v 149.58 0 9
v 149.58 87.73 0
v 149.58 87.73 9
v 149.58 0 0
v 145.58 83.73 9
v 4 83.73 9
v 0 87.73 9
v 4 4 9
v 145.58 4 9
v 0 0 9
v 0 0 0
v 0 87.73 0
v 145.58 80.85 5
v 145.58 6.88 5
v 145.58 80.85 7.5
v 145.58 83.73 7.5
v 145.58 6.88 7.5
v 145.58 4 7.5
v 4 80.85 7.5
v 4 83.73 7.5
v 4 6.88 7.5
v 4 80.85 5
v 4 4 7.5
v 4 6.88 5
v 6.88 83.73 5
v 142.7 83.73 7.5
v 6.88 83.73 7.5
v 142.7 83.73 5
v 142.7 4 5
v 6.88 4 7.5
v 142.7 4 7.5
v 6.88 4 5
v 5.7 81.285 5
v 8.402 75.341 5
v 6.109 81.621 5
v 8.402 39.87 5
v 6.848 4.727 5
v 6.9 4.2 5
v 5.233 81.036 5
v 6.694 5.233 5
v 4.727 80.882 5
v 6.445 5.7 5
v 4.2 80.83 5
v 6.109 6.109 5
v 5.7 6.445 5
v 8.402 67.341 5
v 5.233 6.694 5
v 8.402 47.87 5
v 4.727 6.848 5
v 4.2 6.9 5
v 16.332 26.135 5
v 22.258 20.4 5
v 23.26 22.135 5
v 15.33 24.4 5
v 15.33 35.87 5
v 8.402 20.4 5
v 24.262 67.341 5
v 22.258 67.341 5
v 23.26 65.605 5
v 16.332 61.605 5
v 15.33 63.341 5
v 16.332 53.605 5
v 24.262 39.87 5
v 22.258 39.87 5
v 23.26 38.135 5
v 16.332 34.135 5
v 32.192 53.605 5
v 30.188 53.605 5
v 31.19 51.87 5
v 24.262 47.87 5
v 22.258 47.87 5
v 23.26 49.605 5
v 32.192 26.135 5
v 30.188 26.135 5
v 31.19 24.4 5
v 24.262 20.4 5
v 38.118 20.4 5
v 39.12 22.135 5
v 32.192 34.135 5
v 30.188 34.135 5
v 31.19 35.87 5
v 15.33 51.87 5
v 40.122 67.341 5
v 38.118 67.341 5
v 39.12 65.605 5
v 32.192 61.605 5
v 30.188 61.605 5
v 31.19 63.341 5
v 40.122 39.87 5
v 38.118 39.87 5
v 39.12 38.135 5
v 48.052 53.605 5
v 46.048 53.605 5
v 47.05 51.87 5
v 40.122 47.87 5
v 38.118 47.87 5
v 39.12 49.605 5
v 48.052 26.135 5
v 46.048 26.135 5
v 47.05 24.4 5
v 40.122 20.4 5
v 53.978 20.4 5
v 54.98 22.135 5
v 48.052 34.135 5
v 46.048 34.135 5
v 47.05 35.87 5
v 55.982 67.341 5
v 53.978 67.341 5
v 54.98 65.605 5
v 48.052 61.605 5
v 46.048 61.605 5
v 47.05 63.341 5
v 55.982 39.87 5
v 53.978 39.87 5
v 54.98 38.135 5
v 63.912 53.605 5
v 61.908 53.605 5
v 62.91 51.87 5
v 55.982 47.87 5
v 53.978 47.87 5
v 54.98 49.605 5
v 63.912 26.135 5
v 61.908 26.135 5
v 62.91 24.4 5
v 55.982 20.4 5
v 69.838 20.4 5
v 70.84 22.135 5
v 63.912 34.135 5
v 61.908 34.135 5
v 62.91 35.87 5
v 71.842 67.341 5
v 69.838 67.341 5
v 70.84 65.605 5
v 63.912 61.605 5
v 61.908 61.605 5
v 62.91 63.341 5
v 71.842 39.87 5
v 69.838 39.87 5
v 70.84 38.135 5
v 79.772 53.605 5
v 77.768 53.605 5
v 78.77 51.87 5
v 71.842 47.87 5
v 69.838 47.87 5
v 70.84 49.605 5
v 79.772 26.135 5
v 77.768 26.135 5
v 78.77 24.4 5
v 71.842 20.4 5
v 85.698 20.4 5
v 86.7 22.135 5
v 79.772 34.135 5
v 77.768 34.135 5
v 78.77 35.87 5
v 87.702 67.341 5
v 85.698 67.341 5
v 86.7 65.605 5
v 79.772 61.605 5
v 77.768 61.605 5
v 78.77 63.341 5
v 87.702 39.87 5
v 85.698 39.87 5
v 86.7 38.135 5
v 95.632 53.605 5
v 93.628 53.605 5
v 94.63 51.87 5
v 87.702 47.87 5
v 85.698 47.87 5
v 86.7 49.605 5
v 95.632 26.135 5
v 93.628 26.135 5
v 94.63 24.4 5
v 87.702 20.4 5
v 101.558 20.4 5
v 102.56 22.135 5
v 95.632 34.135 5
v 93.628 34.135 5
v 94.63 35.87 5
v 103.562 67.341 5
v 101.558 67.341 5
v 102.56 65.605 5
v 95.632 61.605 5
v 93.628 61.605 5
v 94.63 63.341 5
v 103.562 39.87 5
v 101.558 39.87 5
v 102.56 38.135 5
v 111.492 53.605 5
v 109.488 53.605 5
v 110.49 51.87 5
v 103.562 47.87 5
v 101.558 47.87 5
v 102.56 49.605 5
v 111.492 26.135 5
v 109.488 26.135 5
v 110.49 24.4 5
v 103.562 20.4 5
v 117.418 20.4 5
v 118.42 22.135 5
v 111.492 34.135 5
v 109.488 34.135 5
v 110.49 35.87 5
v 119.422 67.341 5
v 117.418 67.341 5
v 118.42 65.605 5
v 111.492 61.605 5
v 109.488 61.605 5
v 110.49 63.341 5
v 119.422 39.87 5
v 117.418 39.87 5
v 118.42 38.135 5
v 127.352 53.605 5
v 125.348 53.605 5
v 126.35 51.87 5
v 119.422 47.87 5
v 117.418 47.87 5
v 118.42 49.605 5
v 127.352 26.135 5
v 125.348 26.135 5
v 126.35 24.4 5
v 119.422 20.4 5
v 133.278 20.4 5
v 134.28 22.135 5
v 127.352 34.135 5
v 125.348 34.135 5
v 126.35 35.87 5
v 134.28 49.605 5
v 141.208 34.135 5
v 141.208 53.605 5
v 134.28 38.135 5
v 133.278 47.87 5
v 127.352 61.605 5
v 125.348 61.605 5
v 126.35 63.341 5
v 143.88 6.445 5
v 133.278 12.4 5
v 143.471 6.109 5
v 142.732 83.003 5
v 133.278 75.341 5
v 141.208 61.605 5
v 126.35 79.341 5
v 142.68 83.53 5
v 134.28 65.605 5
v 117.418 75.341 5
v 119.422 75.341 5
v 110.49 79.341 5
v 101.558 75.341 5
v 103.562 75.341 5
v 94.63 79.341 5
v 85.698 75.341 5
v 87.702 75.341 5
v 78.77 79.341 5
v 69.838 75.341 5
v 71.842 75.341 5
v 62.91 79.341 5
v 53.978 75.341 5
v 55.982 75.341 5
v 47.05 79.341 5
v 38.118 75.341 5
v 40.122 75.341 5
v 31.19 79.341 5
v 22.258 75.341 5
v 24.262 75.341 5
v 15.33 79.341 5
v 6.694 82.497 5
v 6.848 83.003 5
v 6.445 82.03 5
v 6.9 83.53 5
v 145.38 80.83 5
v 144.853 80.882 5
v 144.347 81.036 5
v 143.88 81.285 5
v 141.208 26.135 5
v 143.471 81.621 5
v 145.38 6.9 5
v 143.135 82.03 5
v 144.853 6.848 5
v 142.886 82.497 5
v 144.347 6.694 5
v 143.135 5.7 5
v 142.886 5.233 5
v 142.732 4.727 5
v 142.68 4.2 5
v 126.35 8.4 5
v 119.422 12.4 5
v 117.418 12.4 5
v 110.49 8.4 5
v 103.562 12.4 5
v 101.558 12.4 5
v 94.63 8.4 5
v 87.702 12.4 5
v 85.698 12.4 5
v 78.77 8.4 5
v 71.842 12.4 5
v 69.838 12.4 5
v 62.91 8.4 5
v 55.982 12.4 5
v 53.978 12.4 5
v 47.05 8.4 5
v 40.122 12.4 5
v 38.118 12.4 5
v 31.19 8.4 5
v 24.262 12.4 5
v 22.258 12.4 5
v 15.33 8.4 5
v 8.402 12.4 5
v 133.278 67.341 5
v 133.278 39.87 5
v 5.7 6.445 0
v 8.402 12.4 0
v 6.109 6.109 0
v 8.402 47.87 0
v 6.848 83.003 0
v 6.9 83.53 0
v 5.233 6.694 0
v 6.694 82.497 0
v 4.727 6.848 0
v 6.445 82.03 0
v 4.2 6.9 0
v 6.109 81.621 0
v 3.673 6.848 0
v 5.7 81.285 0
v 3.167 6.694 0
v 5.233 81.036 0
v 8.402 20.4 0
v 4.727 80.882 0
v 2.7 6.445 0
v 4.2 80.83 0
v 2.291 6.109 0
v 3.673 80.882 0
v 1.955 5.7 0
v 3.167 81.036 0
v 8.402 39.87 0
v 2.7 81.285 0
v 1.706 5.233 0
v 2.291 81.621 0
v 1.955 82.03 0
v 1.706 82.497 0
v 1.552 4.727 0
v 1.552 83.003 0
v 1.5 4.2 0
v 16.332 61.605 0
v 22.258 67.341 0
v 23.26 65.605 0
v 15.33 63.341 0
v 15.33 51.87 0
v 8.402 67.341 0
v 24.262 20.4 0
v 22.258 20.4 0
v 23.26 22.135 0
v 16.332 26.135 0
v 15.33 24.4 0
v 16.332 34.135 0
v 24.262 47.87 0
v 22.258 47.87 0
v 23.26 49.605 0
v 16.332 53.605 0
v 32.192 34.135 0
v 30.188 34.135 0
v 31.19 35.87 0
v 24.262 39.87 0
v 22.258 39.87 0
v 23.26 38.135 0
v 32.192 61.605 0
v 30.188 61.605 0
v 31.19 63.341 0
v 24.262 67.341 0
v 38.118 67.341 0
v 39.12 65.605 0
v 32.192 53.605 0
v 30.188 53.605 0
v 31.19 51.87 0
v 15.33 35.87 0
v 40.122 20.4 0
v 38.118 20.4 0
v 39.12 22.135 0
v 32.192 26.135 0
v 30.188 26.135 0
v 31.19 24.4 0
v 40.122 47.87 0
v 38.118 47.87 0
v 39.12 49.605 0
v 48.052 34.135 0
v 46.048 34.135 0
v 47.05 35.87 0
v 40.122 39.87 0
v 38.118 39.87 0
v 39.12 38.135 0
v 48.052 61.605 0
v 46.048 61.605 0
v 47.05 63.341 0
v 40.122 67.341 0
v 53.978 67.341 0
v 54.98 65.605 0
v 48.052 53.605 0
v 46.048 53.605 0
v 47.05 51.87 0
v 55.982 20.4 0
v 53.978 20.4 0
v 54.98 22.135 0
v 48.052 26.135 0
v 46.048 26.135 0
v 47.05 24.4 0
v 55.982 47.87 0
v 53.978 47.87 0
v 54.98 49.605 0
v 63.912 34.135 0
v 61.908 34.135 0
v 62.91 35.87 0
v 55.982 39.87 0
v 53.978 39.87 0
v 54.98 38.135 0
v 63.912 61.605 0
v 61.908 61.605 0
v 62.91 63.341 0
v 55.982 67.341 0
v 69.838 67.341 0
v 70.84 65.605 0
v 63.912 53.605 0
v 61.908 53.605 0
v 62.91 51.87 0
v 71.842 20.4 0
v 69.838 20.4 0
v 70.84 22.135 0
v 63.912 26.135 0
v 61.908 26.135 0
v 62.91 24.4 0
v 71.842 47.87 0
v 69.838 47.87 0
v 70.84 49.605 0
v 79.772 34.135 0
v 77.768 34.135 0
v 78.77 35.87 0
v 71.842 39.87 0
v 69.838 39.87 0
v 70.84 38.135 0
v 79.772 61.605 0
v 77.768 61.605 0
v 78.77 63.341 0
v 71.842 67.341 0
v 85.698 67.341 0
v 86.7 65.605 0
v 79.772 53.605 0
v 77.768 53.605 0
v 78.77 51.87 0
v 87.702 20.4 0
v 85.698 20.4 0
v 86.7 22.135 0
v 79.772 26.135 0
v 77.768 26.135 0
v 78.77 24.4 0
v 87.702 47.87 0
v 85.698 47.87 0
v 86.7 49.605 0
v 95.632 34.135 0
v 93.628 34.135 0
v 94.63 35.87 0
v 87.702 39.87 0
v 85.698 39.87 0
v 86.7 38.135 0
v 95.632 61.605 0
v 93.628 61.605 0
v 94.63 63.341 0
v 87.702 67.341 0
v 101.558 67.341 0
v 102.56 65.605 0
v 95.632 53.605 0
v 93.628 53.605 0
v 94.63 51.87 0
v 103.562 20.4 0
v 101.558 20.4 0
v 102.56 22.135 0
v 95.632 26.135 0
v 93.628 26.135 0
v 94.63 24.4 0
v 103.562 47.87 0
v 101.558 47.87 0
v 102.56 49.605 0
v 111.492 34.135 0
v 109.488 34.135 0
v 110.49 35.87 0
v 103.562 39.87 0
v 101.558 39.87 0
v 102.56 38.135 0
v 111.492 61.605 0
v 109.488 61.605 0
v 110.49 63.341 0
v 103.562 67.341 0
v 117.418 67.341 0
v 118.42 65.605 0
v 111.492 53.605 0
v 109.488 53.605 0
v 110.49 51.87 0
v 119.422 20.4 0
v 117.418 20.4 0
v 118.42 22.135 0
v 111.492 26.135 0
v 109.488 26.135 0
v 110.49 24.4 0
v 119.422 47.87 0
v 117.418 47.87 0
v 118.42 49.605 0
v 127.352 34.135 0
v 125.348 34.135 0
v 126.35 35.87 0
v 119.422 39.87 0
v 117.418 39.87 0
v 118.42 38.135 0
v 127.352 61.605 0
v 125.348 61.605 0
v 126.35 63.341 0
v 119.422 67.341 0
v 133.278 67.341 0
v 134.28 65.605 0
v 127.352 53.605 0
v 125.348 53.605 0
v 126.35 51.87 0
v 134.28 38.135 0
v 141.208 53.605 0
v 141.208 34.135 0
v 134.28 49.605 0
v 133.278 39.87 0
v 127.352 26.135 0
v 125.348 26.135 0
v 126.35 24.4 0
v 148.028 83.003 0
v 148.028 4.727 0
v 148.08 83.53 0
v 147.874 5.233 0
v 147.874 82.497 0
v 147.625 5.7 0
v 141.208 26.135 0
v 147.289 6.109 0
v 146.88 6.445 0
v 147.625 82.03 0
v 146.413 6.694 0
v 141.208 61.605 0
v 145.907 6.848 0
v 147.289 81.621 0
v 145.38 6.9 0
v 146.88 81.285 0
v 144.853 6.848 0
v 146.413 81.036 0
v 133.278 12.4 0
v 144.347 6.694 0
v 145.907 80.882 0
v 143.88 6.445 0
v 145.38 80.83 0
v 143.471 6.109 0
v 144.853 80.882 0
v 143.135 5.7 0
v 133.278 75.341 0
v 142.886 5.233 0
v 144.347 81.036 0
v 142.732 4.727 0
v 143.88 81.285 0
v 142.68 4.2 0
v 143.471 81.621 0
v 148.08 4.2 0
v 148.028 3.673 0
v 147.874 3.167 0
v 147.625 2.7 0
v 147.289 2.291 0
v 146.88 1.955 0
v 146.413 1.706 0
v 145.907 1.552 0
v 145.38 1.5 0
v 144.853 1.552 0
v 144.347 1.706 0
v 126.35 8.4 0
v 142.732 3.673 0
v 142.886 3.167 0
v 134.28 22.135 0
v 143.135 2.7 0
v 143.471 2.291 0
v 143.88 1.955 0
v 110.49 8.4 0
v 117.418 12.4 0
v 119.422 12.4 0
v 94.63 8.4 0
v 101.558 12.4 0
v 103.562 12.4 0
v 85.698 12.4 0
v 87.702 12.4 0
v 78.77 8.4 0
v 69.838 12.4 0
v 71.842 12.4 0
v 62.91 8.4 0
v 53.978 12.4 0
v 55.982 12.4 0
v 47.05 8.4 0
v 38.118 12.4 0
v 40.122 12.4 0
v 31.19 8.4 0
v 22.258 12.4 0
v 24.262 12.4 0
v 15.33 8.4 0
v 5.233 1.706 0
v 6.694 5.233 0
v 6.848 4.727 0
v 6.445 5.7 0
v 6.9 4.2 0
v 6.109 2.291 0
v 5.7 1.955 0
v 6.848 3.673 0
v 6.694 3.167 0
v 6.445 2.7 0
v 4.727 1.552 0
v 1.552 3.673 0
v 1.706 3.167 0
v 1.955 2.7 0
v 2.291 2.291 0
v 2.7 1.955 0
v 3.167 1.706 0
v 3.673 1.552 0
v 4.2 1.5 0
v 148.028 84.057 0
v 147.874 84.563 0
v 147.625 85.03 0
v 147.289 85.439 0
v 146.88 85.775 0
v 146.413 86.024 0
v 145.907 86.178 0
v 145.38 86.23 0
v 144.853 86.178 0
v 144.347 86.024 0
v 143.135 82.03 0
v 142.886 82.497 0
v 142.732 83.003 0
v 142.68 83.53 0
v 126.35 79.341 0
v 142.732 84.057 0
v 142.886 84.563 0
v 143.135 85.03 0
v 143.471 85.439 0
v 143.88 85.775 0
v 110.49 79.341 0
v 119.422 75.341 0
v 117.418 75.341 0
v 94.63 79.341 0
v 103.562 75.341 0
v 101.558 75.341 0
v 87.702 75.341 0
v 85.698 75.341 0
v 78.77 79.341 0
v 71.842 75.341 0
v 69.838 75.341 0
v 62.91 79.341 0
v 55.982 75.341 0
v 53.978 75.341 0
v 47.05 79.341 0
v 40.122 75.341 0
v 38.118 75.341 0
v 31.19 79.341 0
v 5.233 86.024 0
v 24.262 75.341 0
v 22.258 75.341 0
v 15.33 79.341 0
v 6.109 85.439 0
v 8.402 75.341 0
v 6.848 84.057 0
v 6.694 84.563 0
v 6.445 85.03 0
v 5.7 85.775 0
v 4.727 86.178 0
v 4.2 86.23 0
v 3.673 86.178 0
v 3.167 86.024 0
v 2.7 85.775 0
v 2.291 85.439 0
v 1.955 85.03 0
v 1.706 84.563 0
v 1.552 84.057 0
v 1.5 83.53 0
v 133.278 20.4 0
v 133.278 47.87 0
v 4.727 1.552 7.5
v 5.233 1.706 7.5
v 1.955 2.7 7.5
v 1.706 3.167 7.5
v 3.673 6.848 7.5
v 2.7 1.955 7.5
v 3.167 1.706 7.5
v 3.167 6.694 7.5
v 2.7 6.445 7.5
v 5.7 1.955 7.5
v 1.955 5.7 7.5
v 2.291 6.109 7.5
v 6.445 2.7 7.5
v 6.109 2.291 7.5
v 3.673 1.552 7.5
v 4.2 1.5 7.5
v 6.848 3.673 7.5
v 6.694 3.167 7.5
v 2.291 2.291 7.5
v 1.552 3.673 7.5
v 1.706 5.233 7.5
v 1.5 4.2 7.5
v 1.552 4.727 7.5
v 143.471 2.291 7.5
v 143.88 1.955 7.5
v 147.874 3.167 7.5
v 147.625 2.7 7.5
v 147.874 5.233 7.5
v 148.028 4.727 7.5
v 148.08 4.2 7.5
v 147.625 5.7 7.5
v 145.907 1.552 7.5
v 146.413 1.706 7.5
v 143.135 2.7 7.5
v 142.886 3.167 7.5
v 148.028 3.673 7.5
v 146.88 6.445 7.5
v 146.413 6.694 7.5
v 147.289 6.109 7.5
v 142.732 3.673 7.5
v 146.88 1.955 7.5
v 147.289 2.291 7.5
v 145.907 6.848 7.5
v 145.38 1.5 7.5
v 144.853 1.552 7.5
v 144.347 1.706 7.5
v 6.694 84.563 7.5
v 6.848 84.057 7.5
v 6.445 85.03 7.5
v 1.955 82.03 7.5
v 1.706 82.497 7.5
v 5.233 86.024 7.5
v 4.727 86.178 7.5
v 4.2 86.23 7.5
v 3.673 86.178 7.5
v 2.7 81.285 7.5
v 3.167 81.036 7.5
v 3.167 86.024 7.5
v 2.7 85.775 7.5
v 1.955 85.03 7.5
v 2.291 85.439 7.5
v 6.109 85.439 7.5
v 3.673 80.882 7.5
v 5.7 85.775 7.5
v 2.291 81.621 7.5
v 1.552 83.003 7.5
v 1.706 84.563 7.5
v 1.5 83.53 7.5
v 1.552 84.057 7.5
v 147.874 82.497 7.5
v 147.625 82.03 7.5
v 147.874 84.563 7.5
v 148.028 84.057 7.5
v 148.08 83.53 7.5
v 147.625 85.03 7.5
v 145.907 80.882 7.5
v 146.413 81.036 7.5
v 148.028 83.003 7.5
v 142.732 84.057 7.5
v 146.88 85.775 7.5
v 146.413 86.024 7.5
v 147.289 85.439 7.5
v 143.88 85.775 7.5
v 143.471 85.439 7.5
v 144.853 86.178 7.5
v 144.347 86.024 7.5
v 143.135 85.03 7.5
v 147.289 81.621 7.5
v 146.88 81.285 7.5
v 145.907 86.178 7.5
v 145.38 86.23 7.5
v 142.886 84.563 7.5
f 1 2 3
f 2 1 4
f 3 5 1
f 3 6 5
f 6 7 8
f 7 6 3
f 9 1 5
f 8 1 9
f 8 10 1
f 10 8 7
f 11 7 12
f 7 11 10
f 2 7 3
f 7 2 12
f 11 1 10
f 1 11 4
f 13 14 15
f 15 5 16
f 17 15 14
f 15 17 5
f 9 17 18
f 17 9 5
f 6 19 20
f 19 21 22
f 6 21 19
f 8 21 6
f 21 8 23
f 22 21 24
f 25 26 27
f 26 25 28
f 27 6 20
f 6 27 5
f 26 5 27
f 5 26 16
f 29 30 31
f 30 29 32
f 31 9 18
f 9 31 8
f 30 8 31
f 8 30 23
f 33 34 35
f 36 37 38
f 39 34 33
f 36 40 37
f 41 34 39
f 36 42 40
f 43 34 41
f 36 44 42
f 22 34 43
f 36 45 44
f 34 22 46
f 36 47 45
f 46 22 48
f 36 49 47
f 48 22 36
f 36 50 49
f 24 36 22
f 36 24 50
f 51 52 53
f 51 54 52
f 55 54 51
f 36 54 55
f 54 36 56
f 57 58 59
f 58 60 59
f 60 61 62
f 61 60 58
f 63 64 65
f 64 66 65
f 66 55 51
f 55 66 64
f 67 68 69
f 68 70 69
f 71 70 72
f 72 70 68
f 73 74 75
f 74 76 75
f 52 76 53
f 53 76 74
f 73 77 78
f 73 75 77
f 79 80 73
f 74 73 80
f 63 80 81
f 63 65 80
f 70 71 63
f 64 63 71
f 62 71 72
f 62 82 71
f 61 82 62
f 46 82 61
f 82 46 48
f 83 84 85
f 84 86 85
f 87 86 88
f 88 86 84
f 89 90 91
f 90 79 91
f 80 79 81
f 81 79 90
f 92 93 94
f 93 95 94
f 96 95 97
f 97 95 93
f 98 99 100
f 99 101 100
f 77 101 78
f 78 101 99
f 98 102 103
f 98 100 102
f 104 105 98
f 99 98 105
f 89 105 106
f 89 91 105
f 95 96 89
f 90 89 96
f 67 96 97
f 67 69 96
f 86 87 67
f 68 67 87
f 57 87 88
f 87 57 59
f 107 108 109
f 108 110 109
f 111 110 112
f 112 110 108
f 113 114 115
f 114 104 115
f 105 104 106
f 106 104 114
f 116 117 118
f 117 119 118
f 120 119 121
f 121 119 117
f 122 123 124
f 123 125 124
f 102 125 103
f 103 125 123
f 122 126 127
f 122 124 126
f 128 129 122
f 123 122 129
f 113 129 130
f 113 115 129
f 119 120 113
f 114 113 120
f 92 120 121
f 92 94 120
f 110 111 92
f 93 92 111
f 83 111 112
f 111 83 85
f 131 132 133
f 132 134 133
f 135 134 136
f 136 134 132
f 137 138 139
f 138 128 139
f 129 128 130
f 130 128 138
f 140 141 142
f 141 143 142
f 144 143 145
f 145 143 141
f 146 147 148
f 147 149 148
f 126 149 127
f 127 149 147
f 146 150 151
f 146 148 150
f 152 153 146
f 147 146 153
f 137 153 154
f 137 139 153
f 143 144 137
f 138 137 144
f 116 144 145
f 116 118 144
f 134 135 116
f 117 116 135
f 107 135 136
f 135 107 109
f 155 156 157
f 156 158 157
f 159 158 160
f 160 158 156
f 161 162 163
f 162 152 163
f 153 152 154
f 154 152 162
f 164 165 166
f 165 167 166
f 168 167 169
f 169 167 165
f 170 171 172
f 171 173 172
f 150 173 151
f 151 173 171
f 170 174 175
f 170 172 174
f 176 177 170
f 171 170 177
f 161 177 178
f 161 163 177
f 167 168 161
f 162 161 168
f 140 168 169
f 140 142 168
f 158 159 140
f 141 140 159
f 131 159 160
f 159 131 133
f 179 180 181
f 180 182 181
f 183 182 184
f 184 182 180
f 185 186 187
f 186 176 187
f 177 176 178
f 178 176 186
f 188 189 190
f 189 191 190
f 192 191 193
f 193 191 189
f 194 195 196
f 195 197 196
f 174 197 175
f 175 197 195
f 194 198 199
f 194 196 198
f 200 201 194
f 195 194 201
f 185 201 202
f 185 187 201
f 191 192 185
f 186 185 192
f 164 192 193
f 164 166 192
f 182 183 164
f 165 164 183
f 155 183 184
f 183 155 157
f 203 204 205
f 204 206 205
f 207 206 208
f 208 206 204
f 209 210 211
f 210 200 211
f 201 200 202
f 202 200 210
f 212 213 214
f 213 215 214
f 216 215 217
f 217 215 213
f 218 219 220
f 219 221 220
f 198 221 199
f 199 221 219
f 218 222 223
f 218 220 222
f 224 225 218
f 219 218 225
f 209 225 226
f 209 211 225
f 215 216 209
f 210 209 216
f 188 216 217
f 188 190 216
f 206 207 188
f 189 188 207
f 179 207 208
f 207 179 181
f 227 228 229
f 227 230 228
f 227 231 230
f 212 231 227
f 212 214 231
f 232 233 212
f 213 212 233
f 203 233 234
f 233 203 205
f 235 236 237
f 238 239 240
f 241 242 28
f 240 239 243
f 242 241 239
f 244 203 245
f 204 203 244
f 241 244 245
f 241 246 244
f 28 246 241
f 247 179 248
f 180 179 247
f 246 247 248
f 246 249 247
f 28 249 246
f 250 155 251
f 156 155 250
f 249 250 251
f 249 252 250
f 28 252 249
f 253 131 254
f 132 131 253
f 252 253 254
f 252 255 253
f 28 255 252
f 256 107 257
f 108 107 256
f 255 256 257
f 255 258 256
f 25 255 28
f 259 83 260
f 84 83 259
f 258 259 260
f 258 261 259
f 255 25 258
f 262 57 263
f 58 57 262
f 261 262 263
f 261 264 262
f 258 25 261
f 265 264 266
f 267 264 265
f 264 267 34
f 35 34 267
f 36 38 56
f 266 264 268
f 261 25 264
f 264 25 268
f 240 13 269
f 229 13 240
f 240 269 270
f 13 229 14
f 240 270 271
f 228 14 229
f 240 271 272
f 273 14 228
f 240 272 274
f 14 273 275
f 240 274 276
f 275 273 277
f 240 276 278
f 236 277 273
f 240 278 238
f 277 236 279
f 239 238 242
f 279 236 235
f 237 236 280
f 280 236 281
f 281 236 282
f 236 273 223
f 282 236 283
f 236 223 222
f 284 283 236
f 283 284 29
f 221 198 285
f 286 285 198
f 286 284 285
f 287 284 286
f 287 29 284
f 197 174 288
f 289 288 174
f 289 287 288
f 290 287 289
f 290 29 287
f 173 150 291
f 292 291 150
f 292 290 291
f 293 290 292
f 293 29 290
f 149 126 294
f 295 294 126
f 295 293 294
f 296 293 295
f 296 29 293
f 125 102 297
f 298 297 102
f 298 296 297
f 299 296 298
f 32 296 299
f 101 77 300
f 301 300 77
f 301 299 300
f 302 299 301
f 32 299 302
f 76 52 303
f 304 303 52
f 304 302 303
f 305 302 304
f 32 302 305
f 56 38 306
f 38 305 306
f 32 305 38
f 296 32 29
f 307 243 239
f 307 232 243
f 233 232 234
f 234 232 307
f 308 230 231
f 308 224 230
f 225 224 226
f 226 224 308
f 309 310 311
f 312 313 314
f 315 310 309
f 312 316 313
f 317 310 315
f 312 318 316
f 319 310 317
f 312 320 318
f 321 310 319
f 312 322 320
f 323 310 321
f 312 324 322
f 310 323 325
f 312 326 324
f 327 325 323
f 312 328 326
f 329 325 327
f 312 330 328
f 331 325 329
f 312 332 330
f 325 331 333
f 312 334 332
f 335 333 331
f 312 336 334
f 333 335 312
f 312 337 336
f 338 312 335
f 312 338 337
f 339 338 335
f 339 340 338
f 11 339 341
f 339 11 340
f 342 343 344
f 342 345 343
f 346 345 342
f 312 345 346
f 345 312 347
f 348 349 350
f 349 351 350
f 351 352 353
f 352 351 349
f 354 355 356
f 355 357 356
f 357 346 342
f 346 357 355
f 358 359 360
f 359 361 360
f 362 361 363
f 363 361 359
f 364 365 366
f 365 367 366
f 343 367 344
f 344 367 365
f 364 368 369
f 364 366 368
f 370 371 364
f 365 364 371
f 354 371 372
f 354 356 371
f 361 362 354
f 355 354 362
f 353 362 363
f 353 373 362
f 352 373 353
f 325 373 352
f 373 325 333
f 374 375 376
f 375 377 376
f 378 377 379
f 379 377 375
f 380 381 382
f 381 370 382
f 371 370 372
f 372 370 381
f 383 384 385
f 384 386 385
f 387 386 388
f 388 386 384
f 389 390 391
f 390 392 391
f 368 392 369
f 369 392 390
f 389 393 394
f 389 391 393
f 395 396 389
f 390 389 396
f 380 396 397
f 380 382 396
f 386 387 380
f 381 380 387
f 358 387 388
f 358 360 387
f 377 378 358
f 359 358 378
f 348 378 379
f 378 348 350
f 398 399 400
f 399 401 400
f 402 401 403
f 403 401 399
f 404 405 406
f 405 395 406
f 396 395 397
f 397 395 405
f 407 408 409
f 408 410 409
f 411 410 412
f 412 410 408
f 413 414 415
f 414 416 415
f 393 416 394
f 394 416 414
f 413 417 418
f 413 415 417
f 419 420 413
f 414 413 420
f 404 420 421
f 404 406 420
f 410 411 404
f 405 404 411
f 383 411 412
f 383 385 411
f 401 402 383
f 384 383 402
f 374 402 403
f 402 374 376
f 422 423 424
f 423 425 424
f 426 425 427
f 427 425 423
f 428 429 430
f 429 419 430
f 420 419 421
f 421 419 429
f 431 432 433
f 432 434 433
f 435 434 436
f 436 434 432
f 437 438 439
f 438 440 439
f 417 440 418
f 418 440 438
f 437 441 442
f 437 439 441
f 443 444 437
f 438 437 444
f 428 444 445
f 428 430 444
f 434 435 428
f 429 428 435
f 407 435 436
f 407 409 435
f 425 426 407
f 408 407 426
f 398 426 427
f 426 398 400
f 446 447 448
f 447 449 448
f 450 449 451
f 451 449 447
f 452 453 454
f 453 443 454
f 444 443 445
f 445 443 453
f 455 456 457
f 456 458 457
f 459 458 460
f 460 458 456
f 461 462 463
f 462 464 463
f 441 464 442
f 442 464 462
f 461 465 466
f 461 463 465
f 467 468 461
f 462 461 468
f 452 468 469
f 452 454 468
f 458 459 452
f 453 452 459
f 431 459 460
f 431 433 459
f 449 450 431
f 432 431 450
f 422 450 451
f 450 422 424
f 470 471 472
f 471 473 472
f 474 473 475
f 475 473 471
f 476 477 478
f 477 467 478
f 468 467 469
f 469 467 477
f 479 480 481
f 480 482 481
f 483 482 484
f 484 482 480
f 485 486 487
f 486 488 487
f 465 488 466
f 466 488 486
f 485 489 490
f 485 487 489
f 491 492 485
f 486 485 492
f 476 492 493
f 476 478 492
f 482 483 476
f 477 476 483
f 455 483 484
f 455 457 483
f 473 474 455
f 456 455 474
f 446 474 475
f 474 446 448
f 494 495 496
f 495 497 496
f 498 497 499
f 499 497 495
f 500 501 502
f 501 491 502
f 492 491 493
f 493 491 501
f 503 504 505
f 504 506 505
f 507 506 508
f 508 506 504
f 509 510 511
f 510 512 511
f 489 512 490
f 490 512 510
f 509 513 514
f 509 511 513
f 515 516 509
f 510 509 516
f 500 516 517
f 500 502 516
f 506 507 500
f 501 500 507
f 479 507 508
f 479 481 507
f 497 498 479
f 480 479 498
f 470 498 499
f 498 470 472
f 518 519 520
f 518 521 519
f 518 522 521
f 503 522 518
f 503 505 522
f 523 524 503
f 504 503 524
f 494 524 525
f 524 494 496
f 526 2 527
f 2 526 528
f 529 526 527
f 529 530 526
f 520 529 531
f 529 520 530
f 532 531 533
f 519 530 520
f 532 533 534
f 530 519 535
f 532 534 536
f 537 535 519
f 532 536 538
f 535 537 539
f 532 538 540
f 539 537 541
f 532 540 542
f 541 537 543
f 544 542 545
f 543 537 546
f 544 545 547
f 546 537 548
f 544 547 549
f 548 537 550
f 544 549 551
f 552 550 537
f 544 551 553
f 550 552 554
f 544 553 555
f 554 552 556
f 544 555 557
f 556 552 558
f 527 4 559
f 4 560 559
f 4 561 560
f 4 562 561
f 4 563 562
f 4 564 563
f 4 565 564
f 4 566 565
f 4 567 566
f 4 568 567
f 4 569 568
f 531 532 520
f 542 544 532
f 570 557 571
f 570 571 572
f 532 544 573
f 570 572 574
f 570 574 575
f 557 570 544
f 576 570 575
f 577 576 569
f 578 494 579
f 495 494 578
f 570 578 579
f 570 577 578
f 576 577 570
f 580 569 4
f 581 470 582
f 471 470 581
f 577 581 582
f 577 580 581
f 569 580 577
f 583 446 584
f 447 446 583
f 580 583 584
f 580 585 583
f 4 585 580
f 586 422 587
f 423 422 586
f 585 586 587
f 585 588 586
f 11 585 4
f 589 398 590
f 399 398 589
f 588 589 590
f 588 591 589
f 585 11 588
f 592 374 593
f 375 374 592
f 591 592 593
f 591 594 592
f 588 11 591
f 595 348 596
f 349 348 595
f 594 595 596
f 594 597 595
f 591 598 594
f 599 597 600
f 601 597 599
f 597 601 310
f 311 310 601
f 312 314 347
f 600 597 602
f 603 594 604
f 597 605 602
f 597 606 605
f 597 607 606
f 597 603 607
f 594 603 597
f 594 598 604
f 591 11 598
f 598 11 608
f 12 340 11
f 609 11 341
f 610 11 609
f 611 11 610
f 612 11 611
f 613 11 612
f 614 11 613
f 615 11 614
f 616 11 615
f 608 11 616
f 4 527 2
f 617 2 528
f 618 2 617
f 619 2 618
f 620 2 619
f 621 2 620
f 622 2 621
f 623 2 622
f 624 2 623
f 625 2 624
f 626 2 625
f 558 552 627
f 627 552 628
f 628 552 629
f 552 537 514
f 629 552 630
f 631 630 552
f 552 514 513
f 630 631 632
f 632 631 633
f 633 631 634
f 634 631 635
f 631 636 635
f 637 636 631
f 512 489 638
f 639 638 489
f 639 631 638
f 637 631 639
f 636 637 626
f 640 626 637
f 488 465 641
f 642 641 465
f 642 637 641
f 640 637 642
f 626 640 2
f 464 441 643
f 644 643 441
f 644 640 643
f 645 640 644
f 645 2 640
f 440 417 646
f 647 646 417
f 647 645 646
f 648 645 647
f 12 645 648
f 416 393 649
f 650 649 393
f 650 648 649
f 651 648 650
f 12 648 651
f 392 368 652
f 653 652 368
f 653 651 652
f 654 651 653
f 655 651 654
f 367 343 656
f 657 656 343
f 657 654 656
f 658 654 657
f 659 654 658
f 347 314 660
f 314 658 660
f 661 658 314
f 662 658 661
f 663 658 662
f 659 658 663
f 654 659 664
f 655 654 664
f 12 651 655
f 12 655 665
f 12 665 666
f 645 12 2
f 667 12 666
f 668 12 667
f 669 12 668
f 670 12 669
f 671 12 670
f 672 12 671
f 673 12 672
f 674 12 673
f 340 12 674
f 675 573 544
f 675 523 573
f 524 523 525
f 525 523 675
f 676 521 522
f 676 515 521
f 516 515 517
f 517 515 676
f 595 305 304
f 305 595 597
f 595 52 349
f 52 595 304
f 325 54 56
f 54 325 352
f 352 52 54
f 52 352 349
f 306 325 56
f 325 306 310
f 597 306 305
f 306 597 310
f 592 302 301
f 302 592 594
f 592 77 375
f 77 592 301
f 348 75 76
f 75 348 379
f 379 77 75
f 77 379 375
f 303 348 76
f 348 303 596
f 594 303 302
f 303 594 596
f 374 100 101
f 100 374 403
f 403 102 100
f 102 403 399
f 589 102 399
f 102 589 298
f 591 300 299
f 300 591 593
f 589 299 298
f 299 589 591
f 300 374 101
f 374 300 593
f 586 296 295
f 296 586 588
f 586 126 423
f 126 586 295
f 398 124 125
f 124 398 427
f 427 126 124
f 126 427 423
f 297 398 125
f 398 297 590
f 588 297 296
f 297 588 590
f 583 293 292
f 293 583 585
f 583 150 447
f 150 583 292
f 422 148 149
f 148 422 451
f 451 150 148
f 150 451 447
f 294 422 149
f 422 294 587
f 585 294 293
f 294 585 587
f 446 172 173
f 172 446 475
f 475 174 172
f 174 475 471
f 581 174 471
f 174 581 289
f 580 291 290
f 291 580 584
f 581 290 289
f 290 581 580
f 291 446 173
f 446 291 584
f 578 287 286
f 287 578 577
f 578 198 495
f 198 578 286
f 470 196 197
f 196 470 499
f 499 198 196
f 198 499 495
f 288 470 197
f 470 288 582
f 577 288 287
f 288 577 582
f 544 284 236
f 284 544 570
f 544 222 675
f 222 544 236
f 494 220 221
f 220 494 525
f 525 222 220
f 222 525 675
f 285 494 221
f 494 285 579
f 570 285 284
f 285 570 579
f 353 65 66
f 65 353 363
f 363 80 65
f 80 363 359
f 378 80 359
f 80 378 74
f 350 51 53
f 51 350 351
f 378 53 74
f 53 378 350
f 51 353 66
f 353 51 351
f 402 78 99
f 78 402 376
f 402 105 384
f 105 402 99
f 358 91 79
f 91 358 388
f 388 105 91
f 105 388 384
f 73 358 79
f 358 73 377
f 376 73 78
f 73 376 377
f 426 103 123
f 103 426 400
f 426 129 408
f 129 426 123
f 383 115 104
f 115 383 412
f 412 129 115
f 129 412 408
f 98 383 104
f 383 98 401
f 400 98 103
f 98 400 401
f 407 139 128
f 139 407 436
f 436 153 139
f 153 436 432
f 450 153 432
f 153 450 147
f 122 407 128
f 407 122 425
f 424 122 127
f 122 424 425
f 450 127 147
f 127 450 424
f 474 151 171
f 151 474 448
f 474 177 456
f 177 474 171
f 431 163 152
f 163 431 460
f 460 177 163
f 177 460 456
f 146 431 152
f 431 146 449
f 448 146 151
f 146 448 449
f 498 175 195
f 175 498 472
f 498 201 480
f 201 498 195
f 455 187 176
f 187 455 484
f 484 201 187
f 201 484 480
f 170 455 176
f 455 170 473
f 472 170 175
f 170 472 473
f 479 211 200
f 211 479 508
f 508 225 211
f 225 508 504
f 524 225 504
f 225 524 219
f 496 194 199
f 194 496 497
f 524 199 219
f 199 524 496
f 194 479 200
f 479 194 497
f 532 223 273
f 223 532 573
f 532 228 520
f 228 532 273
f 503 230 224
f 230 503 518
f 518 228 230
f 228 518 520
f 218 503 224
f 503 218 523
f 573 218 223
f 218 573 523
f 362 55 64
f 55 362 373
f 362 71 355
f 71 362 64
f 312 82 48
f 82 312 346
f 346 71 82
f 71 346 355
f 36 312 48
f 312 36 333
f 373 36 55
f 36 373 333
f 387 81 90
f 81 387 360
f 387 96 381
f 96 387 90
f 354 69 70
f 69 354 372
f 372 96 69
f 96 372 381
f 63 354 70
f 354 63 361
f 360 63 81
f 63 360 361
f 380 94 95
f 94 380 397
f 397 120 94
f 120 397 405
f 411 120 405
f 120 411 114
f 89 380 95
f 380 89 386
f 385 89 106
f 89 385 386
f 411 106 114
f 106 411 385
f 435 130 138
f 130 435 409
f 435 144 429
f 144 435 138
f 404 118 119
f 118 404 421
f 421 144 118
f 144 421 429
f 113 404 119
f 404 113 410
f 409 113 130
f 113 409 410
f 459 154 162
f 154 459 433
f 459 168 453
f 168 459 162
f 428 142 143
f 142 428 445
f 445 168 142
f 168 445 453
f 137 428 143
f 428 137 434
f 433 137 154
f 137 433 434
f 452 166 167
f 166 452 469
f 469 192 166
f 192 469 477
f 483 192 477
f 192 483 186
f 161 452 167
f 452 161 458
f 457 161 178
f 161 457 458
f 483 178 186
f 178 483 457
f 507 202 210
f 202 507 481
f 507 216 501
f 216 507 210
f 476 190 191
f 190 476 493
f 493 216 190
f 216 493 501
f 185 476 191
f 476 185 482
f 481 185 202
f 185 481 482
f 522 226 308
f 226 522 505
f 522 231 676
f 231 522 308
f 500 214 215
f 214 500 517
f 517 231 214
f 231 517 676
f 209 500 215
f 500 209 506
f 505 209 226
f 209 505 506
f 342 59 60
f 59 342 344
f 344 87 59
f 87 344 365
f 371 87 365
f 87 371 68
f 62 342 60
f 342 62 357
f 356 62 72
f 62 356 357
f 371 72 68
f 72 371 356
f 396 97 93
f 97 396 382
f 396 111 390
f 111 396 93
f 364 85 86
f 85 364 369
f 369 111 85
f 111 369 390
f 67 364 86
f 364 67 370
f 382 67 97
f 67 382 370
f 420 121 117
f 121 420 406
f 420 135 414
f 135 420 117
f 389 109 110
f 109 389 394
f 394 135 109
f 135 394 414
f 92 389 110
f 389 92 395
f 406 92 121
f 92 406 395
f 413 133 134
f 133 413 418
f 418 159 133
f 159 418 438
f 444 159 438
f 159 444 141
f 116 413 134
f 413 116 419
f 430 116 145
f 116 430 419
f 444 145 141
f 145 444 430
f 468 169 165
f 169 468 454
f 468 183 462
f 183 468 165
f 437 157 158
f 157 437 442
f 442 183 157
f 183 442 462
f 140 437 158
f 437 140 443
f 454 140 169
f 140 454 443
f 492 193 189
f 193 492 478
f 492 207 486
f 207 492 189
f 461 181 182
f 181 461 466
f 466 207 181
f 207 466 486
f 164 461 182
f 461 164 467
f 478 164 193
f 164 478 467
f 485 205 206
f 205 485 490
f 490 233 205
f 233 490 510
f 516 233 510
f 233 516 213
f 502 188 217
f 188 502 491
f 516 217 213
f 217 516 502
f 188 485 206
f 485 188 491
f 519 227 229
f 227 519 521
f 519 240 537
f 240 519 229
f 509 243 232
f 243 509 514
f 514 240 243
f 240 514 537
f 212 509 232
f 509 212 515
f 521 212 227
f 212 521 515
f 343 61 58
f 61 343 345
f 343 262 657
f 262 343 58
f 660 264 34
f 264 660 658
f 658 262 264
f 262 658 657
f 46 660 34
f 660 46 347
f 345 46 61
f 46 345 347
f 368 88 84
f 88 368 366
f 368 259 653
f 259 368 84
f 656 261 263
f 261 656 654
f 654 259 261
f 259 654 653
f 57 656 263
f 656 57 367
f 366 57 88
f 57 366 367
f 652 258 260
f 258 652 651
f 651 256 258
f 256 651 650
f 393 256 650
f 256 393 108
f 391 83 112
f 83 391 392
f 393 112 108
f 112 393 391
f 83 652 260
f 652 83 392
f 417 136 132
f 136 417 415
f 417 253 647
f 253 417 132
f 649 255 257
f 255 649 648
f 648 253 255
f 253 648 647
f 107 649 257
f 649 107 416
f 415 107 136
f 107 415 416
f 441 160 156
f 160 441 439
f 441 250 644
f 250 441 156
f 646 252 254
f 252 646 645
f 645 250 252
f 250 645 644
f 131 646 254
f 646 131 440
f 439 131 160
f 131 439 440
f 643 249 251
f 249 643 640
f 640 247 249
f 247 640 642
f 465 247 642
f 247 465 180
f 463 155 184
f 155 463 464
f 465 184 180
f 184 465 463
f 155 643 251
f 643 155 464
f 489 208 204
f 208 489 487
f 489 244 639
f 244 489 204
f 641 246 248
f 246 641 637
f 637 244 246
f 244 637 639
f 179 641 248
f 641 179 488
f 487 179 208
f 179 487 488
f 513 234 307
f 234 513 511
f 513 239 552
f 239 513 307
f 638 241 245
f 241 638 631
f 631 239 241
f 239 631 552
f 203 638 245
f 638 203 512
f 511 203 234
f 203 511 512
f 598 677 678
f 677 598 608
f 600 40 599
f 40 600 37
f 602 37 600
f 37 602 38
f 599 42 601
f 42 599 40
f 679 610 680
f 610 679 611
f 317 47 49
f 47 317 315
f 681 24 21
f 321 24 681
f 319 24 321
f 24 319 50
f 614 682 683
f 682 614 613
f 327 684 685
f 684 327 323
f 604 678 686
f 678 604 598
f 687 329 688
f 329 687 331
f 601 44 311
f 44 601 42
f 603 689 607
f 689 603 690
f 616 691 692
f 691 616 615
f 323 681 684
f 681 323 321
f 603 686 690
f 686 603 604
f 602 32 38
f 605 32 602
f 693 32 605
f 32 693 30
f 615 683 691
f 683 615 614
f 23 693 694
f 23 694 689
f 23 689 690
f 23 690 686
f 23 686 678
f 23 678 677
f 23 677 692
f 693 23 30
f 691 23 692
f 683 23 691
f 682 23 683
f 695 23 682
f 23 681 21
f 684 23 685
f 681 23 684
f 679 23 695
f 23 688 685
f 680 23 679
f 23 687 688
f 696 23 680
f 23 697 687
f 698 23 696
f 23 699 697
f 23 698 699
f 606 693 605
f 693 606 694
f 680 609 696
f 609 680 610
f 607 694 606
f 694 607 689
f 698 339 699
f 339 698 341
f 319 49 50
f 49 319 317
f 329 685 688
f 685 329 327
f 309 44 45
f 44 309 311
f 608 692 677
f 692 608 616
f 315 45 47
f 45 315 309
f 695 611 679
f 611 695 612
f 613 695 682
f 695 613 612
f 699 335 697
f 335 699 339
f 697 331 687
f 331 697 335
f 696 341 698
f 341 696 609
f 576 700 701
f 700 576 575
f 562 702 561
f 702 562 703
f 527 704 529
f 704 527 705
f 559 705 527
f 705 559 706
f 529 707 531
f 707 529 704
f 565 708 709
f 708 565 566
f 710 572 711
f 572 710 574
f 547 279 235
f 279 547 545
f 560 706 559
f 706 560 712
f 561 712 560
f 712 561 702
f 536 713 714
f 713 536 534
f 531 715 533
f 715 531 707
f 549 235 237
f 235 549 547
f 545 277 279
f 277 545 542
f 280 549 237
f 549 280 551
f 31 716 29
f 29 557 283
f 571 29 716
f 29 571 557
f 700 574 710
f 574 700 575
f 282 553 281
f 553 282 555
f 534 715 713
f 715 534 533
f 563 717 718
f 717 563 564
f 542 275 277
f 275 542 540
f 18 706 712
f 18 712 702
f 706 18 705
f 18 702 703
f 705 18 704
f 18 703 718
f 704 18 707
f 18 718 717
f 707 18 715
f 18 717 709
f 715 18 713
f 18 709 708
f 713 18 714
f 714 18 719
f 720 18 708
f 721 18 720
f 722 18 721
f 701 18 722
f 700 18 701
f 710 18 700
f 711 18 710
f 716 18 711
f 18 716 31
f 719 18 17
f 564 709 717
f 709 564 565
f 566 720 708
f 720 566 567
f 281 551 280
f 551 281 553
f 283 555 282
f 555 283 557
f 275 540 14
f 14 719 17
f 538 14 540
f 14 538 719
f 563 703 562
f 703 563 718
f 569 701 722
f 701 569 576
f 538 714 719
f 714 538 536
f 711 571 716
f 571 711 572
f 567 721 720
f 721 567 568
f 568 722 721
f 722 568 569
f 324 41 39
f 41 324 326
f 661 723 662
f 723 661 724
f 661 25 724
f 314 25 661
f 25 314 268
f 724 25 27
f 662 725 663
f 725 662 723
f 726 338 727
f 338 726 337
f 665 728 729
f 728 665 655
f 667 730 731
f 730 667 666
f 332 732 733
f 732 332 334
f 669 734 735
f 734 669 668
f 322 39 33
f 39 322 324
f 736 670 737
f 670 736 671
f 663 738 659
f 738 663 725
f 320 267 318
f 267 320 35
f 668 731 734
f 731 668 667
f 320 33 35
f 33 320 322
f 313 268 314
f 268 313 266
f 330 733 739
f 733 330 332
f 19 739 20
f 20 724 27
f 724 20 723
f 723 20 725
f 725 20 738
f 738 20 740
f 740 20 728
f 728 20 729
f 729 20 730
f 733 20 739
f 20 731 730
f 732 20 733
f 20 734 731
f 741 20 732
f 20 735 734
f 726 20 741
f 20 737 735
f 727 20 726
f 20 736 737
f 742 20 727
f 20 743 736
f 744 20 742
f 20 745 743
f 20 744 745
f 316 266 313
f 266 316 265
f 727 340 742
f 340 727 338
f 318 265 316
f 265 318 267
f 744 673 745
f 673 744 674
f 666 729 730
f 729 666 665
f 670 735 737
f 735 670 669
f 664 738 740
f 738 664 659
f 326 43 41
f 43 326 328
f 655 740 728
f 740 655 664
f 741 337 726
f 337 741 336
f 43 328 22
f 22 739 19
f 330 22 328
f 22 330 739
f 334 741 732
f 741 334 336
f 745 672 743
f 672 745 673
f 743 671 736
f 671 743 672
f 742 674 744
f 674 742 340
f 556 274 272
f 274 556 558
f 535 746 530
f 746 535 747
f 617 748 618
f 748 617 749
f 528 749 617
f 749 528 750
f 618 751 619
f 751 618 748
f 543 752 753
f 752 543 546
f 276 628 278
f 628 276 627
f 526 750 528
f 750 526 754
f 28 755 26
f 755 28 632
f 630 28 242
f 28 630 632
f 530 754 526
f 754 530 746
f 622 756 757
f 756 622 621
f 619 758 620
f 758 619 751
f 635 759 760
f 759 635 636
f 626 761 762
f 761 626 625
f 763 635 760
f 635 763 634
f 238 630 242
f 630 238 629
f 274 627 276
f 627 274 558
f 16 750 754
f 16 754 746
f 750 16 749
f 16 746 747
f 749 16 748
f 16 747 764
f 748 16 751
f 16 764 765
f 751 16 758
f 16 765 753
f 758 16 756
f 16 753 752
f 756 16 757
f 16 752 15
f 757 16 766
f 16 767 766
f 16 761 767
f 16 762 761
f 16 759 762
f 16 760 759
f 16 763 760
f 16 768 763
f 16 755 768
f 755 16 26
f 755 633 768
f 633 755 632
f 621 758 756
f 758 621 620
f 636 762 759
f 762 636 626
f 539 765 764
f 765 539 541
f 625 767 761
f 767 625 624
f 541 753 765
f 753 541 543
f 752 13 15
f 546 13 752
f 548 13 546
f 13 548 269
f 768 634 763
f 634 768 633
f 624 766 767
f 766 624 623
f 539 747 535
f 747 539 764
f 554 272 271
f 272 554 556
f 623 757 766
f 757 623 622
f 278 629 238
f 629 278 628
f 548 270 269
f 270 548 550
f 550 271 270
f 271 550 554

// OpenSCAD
$fn = 32;

// ----------------------------------------------------------------------
// Honeycomb panel: 149.58 x 87.73 mm, 40 cells of 16 mm
// ----------------------------------------------------------------------

// --- parameters (mm) ---
panel_w = 149.58;         // panel width
panel_d = 87.73;          // panel depth
thick = 5;                // panel thickness
cell_r = 8;               // hex cell circumradius
pitch = 15.86;            // hex cell pitch (centre to centre)
web = 2;                  // web between the cells
columns = 8;              // columns of cells
rows = 5;                 // rows of cells
cell_count = 40;          // total cells
shift_x = 15.33;          // first cell offset in x
shift_y = 16.4;           // first cell offset in y
mount_d = 5.4;            // corner mounting holes
hole_off = 4.2;           // mounting hole offset from the corners
rim_h = 9;                // rim height
rim_t = 4;                // rim wall thickness

difference() {
  union() {
    cube([panel_w, panel_d, thick]);
    /* rim around the panel, sunk 1 mm into the plate */
    translate([0, 0, thick - 1]) difference() {
      cube([panel_w, panel_d, rim_h - thick + 1]);
      translate([rim_t, rim_t, -2.5]) cube([panel_w - 2 * rim_t, panel_d - 2 * rim_t, rim_h - thick + 6]);
    }
  }
  /* hexagonal cells, point-up, cut right through the plate */
  for (row = [0 : rows - 1]) {
    for (col = [0 : columns - 1]) {
      translate([shift_x + col * pitch + (row % 2) * pitch / 2, shift_y + row * pitch * 0.866025, -2.5]) rotate([0, 0, 30]) cylinder(h = thick + 5, d = 2 * cell_r, $fn = 6);
    }
  }
  /* corner mounting holes, clear of the outer cell web */
  translate([4.2, 4.2, -2.5]) cylinder(h = thick + 5, d = mount_d);
  translate([145.38, 4.2, -2.5]) cylinder(h = thick + 5, d = mount_d);
  translate([4.2, 83.53, -2.5]) cylinder(h = thick + 5, d = mount_d);
  translate([145.38, 83.53, -2.5]) cylinder(h = thick + 5, d = mount_d);
}
